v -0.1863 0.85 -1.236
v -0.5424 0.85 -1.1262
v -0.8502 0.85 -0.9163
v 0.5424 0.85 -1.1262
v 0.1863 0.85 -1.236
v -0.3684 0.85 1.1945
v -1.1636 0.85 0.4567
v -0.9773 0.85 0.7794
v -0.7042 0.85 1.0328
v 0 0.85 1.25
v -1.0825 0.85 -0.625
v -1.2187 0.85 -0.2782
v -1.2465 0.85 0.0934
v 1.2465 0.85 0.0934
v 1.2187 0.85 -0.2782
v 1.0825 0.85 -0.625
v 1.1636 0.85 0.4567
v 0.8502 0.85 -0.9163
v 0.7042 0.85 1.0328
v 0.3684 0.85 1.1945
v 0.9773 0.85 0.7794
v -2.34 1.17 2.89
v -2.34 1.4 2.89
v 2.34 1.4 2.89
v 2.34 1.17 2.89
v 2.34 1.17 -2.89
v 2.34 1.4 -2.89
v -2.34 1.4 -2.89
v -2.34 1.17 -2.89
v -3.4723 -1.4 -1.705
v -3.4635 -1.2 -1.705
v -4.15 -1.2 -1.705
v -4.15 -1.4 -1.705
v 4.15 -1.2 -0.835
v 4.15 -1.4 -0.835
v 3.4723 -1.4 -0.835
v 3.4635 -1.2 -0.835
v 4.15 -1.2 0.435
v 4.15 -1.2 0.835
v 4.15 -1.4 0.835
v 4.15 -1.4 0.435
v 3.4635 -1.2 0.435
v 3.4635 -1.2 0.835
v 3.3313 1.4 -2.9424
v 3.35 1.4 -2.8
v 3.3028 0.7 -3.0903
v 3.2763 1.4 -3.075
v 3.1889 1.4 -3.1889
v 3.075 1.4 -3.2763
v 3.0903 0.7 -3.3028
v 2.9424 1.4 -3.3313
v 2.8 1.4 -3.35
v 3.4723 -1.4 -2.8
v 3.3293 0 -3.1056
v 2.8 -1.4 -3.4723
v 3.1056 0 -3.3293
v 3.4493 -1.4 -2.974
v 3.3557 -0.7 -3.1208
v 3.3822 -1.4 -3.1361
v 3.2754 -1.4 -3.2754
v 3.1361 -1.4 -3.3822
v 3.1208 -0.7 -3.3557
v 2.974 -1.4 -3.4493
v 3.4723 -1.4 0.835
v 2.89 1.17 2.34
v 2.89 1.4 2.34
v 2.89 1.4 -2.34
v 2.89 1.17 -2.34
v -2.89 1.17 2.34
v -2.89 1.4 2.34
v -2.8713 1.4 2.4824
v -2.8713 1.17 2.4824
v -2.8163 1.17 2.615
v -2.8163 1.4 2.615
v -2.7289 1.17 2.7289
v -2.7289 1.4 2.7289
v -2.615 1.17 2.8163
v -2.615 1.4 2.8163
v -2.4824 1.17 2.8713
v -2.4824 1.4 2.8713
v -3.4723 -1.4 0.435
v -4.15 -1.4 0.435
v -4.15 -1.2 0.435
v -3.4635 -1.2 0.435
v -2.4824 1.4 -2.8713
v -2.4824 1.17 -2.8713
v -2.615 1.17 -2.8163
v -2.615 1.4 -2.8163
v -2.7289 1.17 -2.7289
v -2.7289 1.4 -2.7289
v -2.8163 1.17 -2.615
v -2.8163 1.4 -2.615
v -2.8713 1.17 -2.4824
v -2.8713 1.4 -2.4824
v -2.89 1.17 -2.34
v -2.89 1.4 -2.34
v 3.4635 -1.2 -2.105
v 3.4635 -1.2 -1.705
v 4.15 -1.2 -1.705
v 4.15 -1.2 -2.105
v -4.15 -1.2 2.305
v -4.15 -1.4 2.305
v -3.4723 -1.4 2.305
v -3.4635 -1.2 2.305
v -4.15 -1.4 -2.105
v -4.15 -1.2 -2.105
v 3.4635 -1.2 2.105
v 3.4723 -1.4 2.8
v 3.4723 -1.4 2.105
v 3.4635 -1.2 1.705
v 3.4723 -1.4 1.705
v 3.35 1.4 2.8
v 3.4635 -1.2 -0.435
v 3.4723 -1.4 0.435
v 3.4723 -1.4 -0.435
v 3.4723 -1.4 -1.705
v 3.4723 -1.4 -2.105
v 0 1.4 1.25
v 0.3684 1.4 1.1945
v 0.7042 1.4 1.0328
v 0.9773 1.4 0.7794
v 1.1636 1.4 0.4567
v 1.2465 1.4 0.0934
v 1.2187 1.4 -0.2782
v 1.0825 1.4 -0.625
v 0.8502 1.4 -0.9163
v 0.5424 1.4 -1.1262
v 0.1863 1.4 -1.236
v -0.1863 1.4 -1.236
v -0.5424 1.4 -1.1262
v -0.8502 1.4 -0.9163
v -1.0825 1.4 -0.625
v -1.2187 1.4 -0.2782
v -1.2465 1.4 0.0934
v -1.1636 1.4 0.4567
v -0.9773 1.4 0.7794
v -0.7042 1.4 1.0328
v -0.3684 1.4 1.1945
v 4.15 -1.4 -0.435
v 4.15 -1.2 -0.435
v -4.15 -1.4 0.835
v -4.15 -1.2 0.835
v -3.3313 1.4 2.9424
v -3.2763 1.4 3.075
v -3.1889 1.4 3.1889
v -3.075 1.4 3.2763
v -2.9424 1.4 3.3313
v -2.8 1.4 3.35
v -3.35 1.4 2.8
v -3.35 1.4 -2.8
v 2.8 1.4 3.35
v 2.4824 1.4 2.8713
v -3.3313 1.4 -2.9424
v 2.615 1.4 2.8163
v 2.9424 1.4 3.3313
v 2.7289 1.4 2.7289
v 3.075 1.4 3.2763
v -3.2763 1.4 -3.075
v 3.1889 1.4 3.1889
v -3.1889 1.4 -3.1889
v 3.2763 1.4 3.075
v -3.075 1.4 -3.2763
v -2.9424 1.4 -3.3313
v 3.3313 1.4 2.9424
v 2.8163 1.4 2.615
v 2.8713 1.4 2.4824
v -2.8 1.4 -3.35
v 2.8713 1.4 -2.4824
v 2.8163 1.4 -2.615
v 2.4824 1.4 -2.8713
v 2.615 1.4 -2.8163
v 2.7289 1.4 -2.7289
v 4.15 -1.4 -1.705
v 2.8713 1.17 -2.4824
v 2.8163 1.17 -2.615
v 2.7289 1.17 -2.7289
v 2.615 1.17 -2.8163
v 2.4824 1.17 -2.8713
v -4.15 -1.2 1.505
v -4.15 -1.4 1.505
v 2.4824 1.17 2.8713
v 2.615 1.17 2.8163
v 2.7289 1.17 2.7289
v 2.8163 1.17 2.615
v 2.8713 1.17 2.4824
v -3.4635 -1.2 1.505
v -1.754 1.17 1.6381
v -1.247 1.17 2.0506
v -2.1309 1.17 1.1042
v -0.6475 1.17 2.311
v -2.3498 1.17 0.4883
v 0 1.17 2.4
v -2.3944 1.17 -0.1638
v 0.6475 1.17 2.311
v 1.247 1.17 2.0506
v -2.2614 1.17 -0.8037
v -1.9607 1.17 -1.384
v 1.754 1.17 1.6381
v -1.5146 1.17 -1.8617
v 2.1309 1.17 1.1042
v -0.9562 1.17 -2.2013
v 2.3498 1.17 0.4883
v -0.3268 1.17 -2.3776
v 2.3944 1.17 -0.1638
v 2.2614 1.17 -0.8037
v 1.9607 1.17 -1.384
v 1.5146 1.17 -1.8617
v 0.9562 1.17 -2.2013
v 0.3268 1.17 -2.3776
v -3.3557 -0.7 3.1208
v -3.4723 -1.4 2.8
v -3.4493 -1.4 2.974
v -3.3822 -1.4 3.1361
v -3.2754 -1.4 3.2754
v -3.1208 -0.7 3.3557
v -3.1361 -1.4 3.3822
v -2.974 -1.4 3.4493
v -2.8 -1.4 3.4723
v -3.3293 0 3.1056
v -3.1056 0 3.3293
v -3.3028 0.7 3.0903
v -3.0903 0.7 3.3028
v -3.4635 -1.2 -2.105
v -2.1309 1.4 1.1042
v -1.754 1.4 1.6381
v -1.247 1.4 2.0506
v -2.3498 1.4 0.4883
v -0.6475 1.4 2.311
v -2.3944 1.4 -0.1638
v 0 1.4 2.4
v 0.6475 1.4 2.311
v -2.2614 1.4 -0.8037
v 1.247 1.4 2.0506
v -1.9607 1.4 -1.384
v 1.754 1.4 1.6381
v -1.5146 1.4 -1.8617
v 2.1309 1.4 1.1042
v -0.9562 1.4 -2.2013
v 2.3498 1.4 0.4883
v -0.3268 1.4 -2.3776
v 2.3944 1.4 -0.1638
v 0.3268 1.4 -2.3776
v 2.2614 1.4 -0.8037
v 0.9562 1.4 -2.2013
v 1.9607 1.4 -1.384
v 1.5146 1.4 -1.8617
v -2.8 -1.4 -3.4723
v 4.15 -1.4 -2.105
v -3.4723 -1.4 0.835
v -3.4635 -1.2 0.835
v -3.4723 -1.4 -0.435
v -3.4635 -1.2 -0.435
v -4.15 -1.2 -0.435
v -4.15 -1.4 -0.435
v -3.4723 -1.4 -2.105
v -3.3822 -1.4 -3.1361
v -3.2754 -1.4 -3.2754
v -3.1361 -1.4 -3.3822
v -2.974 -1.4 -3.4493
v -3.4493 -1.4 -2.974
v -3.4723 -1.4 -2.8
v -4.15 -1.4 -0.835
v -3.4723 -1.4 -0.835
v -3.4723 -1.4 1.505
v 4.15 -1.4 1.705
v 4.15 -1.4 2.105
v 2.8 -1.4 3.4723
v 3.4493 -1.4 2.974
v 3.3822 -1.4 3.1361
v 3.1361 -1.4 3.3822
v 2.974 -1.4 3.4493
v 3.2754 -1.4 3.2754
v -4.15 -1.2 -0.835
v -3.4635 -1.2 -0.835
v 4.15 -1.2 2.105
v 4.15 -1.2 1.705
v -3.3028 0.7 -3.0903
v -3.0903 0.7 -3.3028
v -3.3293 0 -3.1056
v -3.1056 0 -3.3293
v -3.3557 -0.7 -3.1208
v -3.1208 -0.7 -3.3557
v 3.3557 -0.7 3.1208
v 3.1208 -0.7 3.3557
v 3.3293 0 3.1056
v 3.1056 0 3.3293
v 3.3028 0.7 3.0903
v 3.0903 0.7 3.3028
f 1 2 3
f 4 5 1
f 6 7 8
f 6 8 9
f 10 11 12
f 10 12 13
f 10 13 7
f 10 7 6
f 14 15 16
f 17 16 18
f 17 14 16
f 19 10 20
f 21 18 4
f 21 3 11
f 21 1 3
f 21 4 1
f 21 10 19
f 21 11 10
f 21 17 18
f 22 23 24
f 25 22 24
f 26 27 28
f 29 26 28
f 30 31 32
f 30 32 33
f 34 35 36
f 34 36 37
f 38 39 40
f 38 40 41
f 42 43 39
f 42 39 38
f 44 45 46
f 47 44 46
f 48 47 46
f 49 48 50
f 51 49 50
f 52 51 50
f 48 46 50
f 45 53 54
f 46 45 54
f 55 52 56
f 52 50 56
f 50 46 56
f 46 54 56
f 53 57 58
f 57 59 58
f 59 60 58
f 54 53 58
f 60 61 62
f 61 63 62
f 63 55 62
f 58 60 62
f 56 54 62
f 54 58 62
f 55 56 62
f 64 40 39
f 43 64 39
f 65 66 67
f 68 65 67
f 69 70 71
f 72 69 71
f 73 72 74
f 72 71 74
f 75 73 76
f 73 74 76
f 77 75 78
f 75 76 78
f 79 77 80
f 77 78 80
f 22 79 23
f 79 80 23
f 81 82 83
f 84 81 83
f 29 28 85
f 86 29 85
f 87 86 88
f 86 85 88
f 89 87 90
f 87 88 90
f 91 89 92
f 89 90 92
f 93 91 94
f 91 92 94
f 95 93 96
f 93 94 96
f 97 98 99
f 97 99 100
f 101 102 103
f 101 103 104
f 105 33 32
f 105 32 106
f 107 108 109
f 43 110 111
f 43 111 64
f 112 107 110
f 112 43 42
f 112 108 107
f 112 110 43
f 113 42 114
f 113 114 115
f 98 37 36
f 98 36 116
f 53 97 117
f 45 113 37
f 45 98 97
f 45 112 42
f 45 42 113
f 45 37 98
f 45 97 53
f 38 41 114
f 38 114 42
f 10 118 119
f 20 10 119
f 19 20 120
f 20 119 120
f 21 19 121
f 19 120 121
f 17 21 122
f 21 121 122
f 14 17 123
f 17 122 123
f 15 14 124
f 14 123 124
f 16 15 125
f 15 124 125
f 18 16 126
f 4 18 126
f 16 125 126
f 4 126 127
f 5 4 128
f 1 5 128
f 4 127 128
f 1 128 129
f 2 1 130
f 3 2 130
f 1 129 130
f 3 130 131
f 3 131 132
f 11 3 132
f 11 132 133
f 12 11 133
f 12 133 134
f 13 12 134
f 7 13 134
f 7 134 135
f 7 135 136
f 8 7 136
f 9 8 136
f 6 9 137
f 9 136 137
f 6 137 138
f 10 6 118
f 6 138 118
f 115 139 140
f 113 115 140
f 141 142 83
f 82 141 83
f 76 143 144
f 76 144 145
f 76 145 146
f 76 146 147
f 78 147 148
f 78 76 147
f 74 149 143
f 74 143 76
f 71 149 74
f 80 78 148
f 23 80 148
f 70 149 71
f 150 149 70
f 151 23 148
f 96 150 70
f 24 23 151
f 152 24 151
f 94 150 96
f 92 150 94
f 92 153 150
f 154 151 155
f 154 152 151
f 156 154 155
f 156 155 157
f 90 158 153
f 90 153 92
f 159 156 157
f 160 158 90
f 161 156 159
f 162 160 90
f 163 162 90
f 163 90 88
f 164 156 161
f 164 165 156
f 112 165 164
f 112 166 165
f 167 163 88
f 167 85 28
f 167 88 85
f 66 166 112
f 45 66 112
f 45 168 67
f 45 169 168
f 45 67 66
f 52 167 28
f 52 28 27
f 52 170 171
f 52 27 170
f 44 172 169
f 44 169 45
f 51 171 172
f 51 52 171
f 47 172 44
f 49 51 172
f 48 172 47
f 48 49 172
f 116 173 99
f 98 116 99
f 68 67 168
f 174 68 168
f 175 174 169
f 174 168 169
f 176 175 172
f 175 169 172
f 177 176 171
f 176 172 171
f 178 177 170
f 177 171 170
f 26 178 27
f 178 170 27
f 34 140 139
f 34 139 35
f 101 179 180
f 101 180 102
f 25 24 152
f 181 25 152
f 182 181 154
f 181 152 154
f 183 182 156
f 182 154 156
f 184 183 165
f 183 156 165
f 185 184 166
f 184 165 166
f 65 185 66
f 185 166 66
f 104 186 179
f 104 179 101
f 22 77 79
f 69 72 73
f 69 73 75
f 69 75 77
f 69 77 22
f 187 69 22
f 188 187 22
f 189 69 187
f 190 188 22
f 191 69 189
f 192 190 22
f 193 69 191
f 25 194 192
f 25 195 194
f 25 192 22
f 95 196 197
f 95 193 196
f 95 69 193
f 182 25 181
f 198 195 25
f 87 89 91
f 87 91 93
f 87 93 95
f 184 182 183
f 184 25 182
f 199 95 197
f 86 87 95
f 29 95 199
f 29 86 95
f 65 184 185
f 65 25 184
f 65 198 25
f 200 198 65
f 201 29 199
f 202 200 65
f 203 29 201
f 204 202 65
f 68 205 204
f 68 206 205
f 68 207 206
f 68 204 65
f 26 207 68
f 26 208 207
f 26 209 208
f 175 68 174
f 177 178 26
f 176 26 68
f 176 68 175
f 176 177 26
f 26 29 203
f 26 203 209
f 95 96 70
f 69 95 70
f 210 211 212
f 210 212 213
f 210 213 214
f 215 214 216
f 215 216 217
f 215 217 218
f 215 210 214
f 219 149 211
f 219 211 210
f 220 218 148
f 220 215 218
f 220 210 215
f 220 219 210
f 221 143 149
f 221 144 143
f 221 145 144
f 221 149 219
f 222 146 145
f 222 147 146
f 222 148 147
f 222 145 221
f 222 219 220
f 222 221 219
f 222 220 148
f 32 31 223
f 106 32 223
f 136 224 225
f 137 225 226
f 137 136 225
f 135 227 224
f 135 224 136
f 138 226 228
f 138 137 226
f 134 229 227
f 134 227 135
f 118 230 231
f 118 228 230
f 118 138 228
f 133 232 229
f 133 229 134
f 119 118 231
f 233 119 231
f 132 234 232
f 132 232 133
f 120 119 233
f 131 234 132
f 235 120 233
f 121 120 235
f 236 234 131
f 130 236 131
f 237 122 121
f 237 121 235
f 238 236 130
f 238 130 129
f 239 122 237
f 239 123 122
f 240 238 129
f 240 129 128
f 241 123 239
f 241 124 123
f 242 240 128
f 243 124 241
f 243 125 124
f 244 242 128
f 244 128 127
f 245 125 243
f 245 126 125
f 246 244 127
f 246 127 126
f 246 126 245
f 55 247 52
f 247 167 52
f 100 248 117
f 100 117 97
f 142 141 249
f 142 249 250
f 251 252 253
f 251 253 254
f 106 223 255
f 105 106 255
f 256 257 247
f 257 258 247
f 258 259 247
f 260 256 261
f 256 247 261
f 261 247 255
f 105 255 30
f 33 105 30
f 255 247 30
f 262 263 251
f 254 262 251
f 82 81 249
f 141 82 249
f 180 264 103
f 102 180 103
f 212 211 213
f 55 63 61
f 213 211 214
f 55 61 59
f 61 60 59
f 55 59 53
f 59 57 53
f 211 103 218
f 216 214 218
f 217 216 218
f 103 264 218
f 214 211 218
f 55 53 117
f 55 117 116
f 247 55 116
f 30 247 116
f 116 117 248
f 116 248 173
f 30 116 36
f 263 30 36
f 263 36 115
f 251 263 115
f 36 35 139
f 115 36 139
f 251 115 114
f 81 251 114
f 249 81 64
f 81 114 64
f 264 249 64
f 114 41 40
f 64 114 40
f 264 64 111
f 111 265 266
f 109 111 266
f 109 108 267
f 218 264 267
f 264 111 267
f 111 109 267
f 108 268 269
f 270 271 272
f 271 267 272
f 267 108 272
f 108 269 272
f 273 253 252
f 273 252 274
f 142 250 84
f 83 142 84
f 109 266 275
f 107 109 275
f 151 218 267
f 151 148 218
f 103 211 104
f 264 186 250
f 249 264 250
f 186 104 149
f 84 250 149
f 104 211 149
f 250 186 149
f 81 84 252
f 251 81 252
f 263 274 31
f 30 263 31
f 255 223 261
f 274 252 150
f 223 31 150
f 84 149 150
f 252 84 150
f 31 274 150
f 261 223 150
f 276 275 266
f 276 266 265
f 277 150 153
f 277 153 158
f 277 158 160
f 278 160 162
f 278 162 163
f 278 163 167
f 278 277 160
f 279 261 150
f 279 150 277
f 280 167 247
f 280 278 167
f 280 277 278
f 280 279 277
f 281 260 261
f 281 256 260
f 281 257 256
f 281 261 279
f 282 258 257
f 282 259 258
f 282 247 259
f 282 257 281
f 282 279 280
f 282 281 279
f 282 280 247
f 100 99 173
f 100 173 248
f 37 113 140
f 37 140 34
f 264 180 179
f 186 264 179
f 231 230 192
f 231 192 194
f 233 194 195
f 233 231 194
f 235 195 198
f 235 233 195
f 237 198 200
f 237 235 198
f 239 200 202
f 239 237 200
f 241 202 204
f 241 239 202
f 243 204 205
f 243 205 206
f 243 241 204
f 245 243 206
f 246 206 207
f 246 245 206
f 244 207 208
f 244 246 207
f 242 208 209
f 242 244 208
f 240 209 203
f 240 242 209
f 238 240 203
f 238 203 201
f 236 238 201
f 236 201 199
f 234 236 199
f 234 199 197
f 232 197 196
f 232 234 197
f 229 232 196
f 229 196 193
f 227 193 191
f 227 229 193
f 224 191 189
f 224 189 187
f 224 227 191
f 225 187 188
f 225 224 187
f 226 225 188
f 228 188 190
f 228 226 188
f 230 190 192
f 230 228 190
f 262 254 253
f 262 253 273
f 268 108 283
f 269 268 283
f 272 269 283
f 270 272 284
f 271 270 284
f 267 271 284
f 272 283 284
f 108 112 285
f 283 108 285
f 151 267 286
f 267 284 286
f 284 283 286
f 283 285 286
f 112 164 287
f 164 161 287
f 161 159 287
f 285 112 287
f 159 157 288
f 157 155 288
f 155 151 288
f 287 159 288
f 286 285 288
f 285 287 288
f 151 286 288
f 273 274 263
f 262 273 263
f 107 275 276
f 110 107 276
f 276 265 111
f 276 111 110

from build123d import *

# Parameters (mm, degrees)
SKETCH1_W               = 6.7
SKETCH1_H               = 6.7
BOSS_EXTRUDE1_DEPTH     = 1.4
SKETCH2_W               = 0.4
SKETCH2_H               = 0.2
BOSS_EXTRUDE2_DEPTH     = 0.8
LPATTERN1_COUNT         = 3
LPATTERN1_PITCH         = 1.27
LPATTERN1_COL_COUNT     = 2
LPATTERN1_COL_PITCH     = 1.27
MIRROR1_COPY_1_SKETCH_W = 0.4
MIRROR1_COPY_1_SKETCH_H = 0.2
MIRROR1_COPY_1_DEPTH    = 0.8
MIRROR1_COPY_2_SKETCH_W = 0.4
MIRROR1_COPY_2_SKETCH_H = 0.2
MIRROR1_COPY_2_DEPTH    = 0.8
MIRROR1_COPY_3_SKETCH_W = 0.4
MIRROR1_COPY_3_SKETCH_H = 0.2
MIRROR1_COPY_3_DEPTH    = 0.8
SKETCH3_W               = 0.8
SKETCH3_H               = 0.2
BOSS_EXTRUDE3_DEPTH     = 0.8
FILLET1_R               = 0.55
DRAFT1_ANGLE            = 2.5
SKETCH4_R               = 1.25
CUT_EXTRUDE1_DEPTH      = 0.55
SKETCH5_R               = 2.4
CUT_EXTRUDE2_DEPTH      = 0.23


with BuildPart() as part:
    # Sketch1 → Boss-Extrude1 (new, symmetric)
    with BuildSketch(Plane(origin=(0, 0, 0), x_dir=(1, 0, 0), z_dir=(0, 1, 0))):
        Rectangle(SKETCH1_W, SKETCH1_H)
    extrude(amount=BOSS_EXTRUDE1_DEPTH, both=True)

    # Sketch2 → Boss-Extrude2 (add)
    with BuildSketch(Plane(origin=(3.35, 0, 0), x_dir=(0, 0, -1), z_dir=(1, 0, 0))):
        with Locations((-0.635, -1.3)):
            Rectangle(SKETCH2_W, SKETCH2_H)
    boss_extrude2 = extrude(amount=BOSS_EXTRUDE2_DEPTH)

    # LPattern1: Boss-Extrude2 ×3
    with Locations(*[(0, 0, -i * LPATTERN1_PITCH) for i in range(1, LPATTERN1_COUNT)]):
        add(boss_extrude2)

    # LPattern1 col: Boss-Extrude2 ×2
    with Locations(*[(0, 0, i * LPATTERN1_COL_PITCH) for i in range(1, LPATTERN1_COL_COUNT)]):
        add(boss_extrude2)

    # Mirror1: Boss-Extrude2 across plane
    add(boss_extrude2.mirror(Plane(origin=(0, 0, 0), x_dir=(0, 0, 1), z_dir=(1, 0, 0))))

    # Mirror1 copy 1 sketch → Mirror1 copy 1 (add)
    with BuildSketch(Plane(origin=(-3.35, 0, -1.27), x_dir=(0, 0, -1), z_dir=(-1, 0, 0))):
        with Locations((-0.635, 1.3)):
            Rectangle(MIRROR1_COPY_1_SKETCH_W, MIRROR1_COPY_1_SKETCH_H)
    extrude(amount=MIRROR1_COPY_1_DEPTH)

    # Mirror1 copy 2 sketch → Mirror1 copy 2 (add)
    with BuildSketch(Plane(origin=(-3.35, 0, -2.54), x_dir=(0, 0, -1), z_dir=(-1, 0, 0))):
        with Locations((-0.635, 1.3)):
            Rectangle(MIRROR1_COPY_2_SKETCH_W, MIRROR1_COPY_2_SKETCH_H)
    extrude(amount=MIRROR1_COPY_2_DEPTH)

    # Mirror1 copy 3 sketch → Mirror1 copy 3 (add)
    with BuildSketch(Plane(origin=(-3.35, 0, 1.27), x_dir=(0, 0, -1), z_dir=(-1, 0, 0))):
        with Locations((-0.635, 1.3)):
            Rectangle(MIRROR1_COPY_3_SKETCH_W, MIRROR1_COPY_3_SKETCH_H)
    extrude(amount=MIRROR1_COPY_3_DEPTH)

    # Sketch3 → Boss-Extrude3 (add)
    with BuildSketch(Plane.ZY.offset(3.35)):
        with Locations((1.905, -1.3)):
            Rectangle(SKETCH3_W, SKETCH3_H)
    extrude(amount=BOSS_EXTRUDE3_DEPTH)

    # Fillet1
    fillet1_edges = [part.edges().sort_by_distance(p)[0] for p in [
        (3.35, 0, -3.35),
        (3.35, 0, 3.35),
        (-3.35, 0, 3.35),
        (-3.35, 0, -3.35),
    ]]
    fillet(fillet1_edges, radius=FILLET1_R)

    # Draft1
    draft1_faces = [part.faces().sort_by_distance(p)[0] for p in [
        (3.18890873, 0, 3.18890873),
        (3.35, 0.027083333, 0),
        (3.18890873, 0, -3.18890873),
        (-3.18890873, 0, -3.18890873),
        (-3.18890873, 0, 3.18890873),
        (0, 0, 3.35),
        (-3.35, 0.034031414, -0.009973822),
        (0, 0, -3.35),
    ]]
    draft(draft1_faces, Plane.ZX.offset(1.4), DRAFT1_ANGLE)

    # Sketch4 → Cut-Extrude1 (cut)
    with BuildSketch(Plane(origin=(0, 1.4, 0), x_dir=(1, 0, 0), z_dir=(0, 1, 0))):
        with Locations(Location((0, 0, 0), (0, 0, 270))):
            Circle(SKETCH4_R)
    extrude(amount=-CUT_EXTRUDE1_DEPTH, mode=Mode.SUBTRACT)

    # Sketch5 → Cut-Extrude2 (cut)
    with BuildSketch(Plane(origin=(0, 1.4, 0), x_dir=(1, 0, 0), z_dir=(0, 1, 0))):
        with BuildLine():
            Line((-2.34, -2.89), (2.34, -2.89))
            ThreePointArc((2.34, -2.89), (2.72890873, -2.72890873), (2.89, -2.34))
            Line((2.89, -2.34), (2.89, 2.34))
            ThreePointArc((2.89, 2.34), (2.72890873, 2.72890873), (2.34, 2.89))
            Line((2.34, 2.89), (-2.34, 2.89))
            ThreePointArc((-2.34, 2.89), (-2.72890873, 2.72890873), (-2.89, 2.34))
            Line((-2.89, 2.34), (-2.89, -2.34))
            ThreePointArc((-2.89, -2.34), (-2.72890873, -2.72890873), (-2.34, -2.89))
        make_face()
        with Locations(Location((0, 0, 0), (0, 0, 270))):
            Circle(SKETCH5_R, mode=Mode.SUBTRACT)
    extrude(amount=-CUT_EXTRUDE2_DEPTH, mode=Mode.SUBTRACT)


solid = part.part
